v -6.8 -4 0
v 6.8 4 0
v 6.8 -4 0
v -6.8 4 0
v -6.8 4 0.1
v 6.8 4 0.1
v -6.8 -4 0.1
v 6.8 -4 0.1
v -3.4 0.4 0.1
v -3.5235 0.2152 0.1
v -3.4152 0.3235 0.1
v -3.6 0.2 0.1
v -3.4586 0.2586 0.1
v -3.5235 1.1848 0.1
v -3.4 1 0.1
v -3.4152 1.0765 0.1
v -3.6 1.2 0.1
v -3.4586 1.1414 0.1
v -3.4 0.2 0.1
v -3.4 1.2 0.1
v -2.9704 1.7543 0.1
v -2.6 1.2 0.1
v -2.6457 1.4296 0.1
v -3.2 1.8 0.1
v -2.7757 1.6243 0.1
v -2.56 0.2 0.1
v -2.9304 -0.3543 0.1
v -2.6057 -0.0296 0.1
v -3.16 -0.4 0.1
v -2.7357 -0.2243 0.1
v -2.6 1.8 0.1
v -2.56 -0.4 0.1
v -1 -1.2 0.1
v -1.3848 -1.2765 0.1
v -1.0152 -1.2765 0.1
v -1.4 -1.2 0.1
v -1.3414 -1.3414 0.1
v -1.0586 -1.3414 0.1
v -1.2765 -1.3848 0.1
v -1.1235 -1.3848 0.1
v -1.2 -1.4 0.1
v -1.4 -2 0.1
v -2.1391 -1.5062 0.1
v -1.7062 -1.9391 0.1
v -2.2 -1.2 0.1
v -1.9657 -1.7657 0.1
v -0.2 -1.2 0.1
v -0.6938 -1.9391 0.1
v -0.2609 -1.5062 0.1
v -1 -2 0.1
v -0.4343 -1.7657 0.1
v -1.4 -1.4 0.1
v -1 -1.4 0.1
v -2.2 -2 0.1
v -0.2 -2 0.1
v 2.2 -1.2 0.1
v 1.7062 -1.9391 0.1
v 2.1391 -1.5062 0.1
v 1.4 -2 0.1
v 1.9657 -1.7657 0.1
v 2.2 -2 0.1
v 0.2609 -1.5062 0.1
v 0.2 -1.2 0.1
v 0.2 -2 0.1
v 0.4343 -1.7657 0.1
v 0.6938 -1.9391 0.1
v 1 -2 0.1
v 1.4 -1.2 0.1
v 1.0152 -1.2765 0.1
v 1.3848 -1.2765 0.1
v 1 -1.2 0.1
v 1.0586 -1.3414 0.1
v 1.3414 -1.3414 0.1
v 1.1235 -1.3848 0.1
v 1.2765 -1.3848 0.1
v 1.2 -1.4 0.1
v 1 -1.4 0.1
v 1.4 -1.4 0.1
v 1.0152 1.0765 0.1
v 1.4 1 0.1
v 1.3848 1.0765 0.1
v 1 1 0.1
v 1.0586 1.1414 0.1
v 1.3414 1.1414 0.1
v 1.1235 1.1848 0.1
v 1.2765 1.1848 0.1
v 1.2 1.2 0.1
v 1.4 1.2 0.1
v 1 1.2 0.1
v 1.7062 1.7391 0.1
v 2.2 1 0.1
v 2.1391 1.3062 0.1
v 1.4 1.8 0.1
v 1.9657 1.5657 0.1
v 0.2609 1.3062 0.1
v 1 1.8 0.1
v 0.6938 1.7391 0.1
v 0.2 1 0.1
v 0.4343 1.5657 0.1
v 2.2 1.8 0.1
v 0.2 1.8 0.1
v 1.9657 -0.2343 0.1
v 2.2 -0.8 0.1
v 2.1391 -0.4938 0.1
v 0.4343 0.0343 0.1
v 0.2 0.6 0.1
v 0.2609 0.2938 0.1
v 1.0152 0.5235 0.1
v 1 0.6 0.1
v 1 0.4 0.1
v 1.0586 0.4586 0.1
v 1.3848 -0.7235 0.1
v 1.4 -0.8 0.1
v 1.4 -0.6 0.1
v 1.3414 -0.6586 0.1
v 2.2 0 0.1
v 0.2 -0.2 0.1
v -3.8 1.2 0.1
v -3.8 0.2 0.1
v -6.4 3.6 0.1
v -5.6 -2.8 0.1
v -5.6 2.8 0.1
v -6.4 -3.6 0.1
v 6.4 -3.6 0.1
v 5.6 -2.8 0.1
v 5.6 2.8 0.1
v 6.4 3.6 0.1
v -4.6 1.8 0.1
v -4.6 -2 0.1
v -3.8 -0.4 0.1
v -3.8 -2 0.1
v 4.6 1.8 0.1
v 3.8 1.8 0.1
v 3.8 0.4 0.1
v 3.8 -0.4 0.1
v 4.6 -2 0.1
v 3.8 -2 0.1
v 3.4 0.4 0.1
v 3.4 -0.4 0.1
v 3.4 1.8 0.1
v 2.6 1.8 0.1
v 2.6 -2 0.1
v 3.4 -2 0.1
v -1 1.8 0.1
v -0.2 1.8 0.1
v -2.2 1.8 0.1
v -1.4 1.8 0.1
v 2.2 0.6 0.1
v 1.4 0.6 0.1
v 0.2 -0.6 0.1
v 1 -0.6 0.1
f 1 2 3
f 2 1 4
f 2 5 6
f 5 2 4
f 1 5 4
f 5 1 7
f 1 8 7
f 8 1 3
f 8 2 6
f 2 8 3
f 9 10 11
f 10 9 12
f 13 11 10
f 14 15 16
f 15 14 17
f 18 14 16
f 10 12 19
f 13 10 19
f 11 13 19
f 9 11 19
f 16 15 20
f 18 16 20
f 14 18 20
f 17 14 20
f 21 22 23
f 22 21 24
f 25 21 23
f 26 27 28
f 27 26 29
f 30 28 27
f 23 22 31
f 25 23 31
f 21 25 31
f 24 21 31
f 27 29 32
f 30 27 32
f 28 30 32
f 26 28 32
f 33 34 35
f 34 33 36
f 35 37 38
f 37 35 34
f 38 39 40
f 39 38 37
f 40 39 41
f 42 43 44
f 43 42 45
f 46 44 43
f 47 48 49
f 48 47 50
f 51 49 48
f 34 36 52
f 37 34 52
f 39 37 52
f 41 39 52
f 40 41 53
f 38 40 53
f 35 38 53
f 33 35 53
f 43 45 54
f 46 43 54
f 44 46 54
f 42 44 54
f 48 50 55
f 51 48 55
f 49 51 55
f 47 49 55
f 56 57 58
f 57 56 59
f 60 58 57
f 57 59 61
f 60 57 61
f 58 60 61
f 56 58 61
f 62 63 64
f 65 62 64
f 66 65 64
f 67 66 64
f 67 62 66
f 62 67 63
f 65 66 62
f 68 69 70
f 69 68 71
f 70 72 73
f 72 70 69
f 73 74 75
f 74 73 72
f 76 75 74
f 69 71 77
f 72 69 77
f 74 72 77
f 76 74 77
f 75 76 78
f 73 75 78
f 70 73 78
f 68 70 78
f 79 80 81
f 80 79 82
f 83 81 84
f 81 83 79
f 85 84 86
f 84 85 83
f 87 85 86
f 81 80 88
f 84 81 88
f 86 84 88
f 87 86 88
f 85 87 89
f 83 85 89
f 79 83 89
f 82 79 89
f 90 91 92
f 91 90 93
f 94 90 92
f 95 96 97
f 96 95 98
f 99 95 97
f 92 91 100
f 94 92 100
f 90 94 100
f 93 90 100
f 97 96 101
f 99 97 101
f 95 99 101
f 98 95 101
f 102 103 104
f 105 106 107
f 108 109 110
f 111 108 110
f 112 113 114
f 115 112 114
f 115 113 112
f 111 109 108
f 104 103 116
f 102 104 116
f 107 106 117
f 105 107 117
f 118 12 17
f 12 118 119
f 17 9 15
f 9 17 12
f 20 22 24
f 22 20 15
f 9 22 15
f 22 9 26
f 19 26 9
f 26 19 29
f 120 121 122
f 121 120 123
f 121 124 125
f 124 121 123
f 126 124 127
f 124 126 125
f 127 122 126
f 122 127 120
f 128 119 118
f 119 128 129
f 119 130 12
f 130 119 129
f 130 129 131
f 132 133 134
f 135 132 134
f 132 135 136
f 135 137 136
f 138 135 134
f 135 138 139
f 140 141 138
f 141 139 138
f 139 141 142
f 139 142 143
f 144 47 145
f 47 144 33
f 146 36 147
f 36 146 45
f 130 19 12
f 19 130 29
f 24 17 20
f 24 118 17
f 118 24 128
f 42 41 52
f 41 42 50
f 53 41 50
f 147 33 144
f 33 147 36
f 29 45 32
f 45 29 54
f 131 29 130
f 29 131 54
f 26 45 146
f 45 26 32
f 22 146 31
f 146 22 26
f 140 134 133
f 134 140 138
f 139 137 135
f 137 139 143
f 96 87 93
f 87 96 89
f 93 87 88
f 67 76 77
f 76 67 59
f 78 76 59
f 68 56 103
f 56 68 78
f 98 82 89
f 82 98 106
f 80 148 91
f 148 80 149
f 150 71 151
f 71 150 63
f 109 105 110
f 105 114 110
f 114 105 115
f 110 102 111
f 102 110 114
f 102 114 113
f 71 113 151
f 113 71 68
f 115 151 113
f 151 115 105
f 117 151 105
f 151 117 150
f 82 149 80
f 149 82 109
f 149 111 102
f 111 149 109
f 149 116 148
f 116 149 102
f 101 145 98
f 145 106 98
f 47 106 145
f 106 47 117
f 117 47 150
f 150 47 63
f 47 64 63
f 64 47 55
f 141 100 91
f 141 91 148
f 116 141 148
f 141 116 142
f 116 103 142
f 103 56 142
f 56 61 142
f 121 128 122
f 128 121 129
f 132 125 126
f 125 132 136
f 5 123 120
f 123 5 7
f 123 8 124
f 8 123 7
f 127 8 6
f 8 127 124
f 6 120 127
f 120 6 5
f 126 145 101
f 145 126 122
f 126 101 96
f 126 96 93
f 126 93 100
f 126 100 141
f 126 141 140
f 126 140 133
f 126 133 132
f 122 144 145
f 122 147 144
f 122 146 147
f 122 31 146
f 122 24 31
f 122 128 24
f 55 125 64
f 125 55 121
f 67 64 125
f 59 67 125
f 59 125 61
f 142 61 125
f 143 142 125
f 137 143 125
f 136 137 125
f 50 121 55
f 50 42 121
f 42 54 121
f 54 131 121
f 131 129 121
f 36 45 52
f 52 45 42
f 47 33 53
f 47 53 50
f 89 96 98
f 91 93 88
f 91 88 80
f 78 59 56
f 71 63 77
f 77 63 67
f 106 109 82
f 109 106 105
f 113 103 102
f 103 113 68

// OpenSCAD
// file: ../p/box5-12.scad
use <../lib.scad>
function ldraw_lib__box5_12() = [
// 0 Box with 5 Faces without Any Edges
// 0 Name: box5-12.dat
// 0 Author: Chris Dee [cwdee]
// 0 !LDRAW_ORG Primitive UPDATE 2009-02
// 0 !LICENSE Licensed under CC BY 2.0 and CC BY 4.0 : see CAreadme.txt
// 
// 0 BFC CERTIFY CCW
  [0,"BFC","CERTIFY"],
  [0,"BFC","CCW"],
// 
// 0 !HISTORY 2009-09-03 [PTadmin] Official Update 2009-02
// 
// 
// 4 16 1 1 1 1 1 -1 -1 1 -1 -1 1 1
  [4,16,1,1,1,1,1,-1,-1,1,-1,-1,1,1],
// 4 16 -1 0 1 1 0 1 1 1 1 -1 1 1
  [4,16,-1,0,1,1,0,1,1,1,1,-1,1,1],
// 4 16 -1 0 -1 -1 0 1 -1 1 1 -1 1 -1
  [4,16,-1,0,-1,-1,0,1,-1,1,1,-1,1,-1],
// 4 16 1 0 -1 -1 0 -1 -1 1 -1 1 1 -1
  [4,16,1,0,-1,-1,0,-1,-1,1,-1,1,1,-1],
// 4 16 1 0 1 1 0 -1 1 1 -1 1 1 1
  [4,16,1,0,1,1,0,-1,1,1,-1,1,1,1],
// 0
];
makepoly(ldraw_lib__box5_12(), line=0.2);
// file: ../p/2-4ndis.scad
use <../lib.scad>
function ldraw_lib__2_4ndis() = [
// 0 Disc Negative 0.5
// 0 Name: 2-4ndis.dat
// 0 Author: James Jessiman
// 0 !LDRAW_ORG Primitive UPDATE 2012-01
// 0 !LICENSE Licensed under CC BY 2.0 and CC BY 4.0 : see CAreadme.txt
// 
// 0 BFC CERTIFY CCW
  [0,"BFC","CERTIFY"],
  [0,"BFC","CCW"],
// 
// 0 !HISTORY 2002-03-23 [sbliss] Added BFC statement; compacted code
// 0 !HISTORY 2002-04-25 [PTadmin] Official Update 2002-02
// 0 !HISTORY 2007-06-24 [PTadmin] Header formatted for Contributor Agreement
// 0 !HISTORY 2008-07-01 [PTadmin] Official Update 2008-01
// 0 !HISTORY 2012-02-16 [Philo] Changed to CCW
// 0 !HISTORY 2012-03-30 [PTadmin] Official Update 2012-01
// 
// 
// 3 16 0.9239 0 0.3827 1 0 0 1 0 1
  [3,16,0.9239,0,0.3827,1,0,0,1,0,1],
// 3 16 0.7071 0 0.7071 0.9239 0 0.3827 1 0 1
  [3,16,0.7071,0,0.7071,0.9239,0,0.3827,1,0,1],
// 3 16 0.3827 0 0.9239 0.7071 0 0.7071 1 0 1
  [3,16,0.3827,0,0.9239,0.7071,0,0.7071,1,0,1],
// 3 16 0 0 1 0.3827 0 0.9239 1 0 1
  [3,16,0,0,1,0.3827,0,0.9239,1,0,1],
// 3 16 -0.3827 0 0.9239 0 0 1 -1 0 1
  [3,16,-0.3827,0,0.9239,0,0,1,-1,0,1],
// 3 16 -0.7071 0 0.7071 -0.3827 0 0.9239 -1 0 1
  [3,16,-0.7071,0,0.7071,-0.3827,0,0.9239,-1,0,1],
// 3 16 -0.9239 0 0.3827 -0.7071 0 0.7071 -1 0 1
  [3,16,-0.9239,0,0.3827,-0.7071,0,0.7071,-1,0,1],
// 3 16 -1 0 0 -0.9239 0 0.3827 -1 0 1
  [3,16,-1,0,0,-0.9239,0,0.3827,-1,0,1],
];
makepoly(ldraw_lib__2_4ndis(), line=0.2);
// file: ../p/2-4chrd.scad
use <../lib.scad>
function ldraw_lib__2_4chrd() = [
// 0 Chord 0.5
// 0 Name: 2-4chrd.dat
// 0 Author: Philippe Hurbain [Philo]
// 0 !LDRAW_ORG Primitive UPDATE 2014-01
// 0 !LICENSE Licensed under CC BY 2.0 and CC BY 4.0 : see CAreadme.txt
// 
// 0 BFC CERTIFY CCW
  [0,"BFC","CERTIFY"],
  [0,"BFC","CCW"],
// 
// 0 !HISTORY 2014-06-21 [PTadmin] Official Update 2014-01
// 
// 
// 4 16 0.9239 0 0.3827 -0.9239 0 0.3827 -1 0 0 1 0 0
  [4,16,0.9239,0,0.3827,-0.9239,0,0.3827,-1,0,0,1,0,0],
// 4 16 0.7071 0 0.7071 -0.7071 0 0.7071 -0.9239 0 0.3827 0.9239 0 0.3827
  [4,16,0.7071,0,0.7071,-0.7071,0,0.7071,-0.9239,0,0.3827,0.9239,0,0.3827],
// 4 16 0.3827 0 0.9239 -0.3827 0 0.9239 -0.7071 0 0.7071 0.7071 0 0.7071
  [4,16,0.3827,0,0.9239,-0.3827,0,0.9239,-0.7071,0,0.7071,0.7071,0,0.7071],
// 3 16 0 0 1 -0.3827 0 0.9239 0.3827 0 0.9239
  [3,16,0,0,1,-0.3827,0,0.9239,0.3827,0,0.9239],
];
makepoly(ldraw_lib__2_4chrd(), line=0.2);
// file: ../p/1-8ndis.scad
use <../lib.scad>
function ldraw_lib__1_8ndis() = [
// 0 Disc Negative 0.125
// 0 Name: 1-8ndis.dat
// 0 Author: James Jessiman
// 0 !LDRAW_ORG Primitive UPDATE 2012-01
// 0 !LICENSE Licensed under CC BY 2.0 and CC BY 4.0 : see CAreadme.txt
// 
// 0 BFC CERTIFY CCW
  [0,"BFC","CERTIFY"],
  [0,"BFC","CCW"],
// 
// 0 !HISTORY 2002-03-23 [sbliss] Added BFC statement
// 0 !HISTORY 2002-04-25 [PTadmin] Official Update 2002-02
// 0 !HISTORY 2007-06-22 [PTadmin] Header formatted for Contributor Agreement
// 0 !HISTORY 2008-07-01 [PTadmin] Official Update 2008-01
// 0 !HISTORY 2012-02-16 [Philo] Changed to CCW
// 0 !HISTORY 2012-03-30 [PTadmin] Official Update 2012-01
// 
// 
// 3 16 0.9239 0 0.3827 1 0 0 1 0 1
  [3,16,0.9239,0,0.3827,1,0,0,1,0,1],
// 3 16 0.7071 0 0.7071 0.9239 0 0.3827 1 0 1
  [3,16,0.7071,0,0.7071,0.9239,0,0.3827,1,0,1],
];
makepoly(ldraw_lib__1_8ndis(), line=0.2);
// file: ../p/1-8chrd.scad
use <../lib.scad>
function ldraw_lib__1_8chrd() = [
// 0 Chord 0.125
// 0 Name: 1-8chrd.dat
// 0 Author: Andy Westrate [westrate]
// 0 !LDRAW_ORG Primitive UPDATE 2004-02
// 0 !LICENSE Licensed under CC BY 2.0 and CC BY 4.0 : see CAreadme.txt
// 
// 0 BFC CERTIFY CCW
  [0,"BFC","CERTIFY"],
  [0,"BFC","CCW"],
// 
// 0 !HISTORY 2004-04-22 [PTadmin] Official Update 2004-02
// 0 !HISTORY 2007-06-22 [PTadmin] Header formatted for Contributor Agreement
// 0 !HISTORY 2008-07-01 [PTadmin] Official Update 2008-01
// 
// 
// 3 16 0.7071 0 0.7071 1 0 0 0.9239 0 0.3827
  [3,16,0.7071,0,0.7071,1,0,0,0.9239,0,0.3827],
// 
// 0
];
makepoly(ldraw_lib__1_8chrd(), line=0.2);
// file: ../p/1-4ndis.scad
use <../lib.scad>
function ldraw_lib__1_4ndis() = [
// 0 Disc Negative 0.25
// 0 Name: 1-4ndis.dat
// 0 Author: James Jessiman
// 0 !LDRAW_ORG Primitive UPDATE 2012-01
// 0 !LICENSE Licensed under CC BY 2.0 and CC BY 4.0 : see CAreadme.txt
// 
// 0 BFC CERTIFY CCW
  [0,"BFC","CERTIFY"],
  [0,"BFC","CCW"],
// 
// 0 !HISTORY 2002-03-23 [sbliss] Added BFC Statement
// 0 !HISTORY 2002-04-25 [PTadmin] Official Update 2002-02
// 0 !HISTORY 2007-06-22 [PTadmin] Header formatted for Contributor Agreement
// 0 !HISTORY 2008-07-01 [PTadmin] Official Update 2008-01
// 0 !HISTORY 2012-02-16 [Philo] Changed to CCW
// 0 !HISTORY 2012-03-30 [PTadmin] Official Update 2012-01
// 
// 
// 3 16 0.9239 0 0.3827 1 0 0 1 0 1
  [3,16,0.9239,0,0.3827,1,0,0,1,0,1],
// 3 16 0.7071 0 0.7071 0.9239 0 0.3827 1 0 1
  [3,16,0.7071,0,0.7071,0.9239,0,0.3827,1,0,1],
// 3 16 0.3827 0 0.9239 0.7071 0 0.7071 1 0 1
  [3,16,0.3827,0,0.9239,0.7071,0,0.7071,1,0,1],
// 3 16 0 0 1 0.3827 0 0.9239 1 0 1
  [3,16,0,0,1,0.3827,0,0.9239,1,0,1],
];
makepoly(ldraw_lib__1_4ndis(), line=0.2);
// file: ../p/1-4chrd.scad
use <../lib.scad>
function ldraw_lib__1_4chrd() = [
// 0 Chord 0.25
// 0 Name: 1-4chrd.dat
// 0 Author: Tony Hafner [hafhead]
// 0 !LDRAW_ORG Primitive UPDATE 2012-02
// 0 !LICENSE Licensed under CC BY 2.0 and CC BY 4.0 : see CAreadme.txt
// 
// 0 BFC CERTIFY CCW
  [0,"BFC","CERTIFY"],
  [0,"BFC","CCW"],
// 
// 0 !HISTORY 2004-04-22 [PTadmin] Official Update 2004-02
// 0 !HISTORY 2007-10-09 [PTadmin] Header formatted for Contributor Agreement
// 0 !HISTORY 2008-07-01 [PTadmin] Official Update 2008-01
// 0 !HISTORY 2012-08-02 [MMR1988] Re-creation with PrimGen2 and Rectifier
// 0 !HISTORY 2012-08-09 [PTadmin] Official Update 2012-02
// 
// 
// 4 16 0.9239 0 0.3827 0.3827 0 0.9239 0 0 1 1 0 0
  [4,16,0.9239,0,0.3827,0.3827,0,0.9239,0,0,1,1,0,0],
// 3 16 0.7071 0 0.7071 0.3827 0 0.9239 0.9239 0 0.3827
  [3,16,0.7071,0,0.7071,0.3827,0,0.9239,0.9239,0,0.3827],
];
makepoly(ldraw_lib__1_4chrd(), line=0.2);
// main file
use <../lib.scad>
use <../p/1-4chrd.scad>
use <../p/1-4ndis.scad>
use <../p/1-8chrd.scad>
use <../p/1-8ndis.scad>
use <../p/2-4chrd.scad>
use <../p/2-4ndis.scad>
use <../p/box5-12.scad>
function ldraw_lib__4201018c() = [
// 0 Sticker  1.0 x  1.7 with White "PUSH"
// 0 Name: 4201018c.dat
// 0 Author: Tim Lampmann [L4mpi]
// 0 !LDRAW_ORG Part UPDATE 2019-03
// 0 !LICENSE Licensed under CC BY 2.0 and CC BY 4.0 : see CAreadme.txt
// 
// 0 BFC CERTIFY CCW
  [0,"BFC","CERTIFY"],
  [0,"BFC","CCW"],
// 
// 0 !KEYWORDS Grand Central Station, Set 4513, Train
// 
// 0 !HISTORY 2019-12-27 [PTadmin] Official Update 2019-03
// 
// 
// 1 16 0 -0.25 0 17 0 0 0 0.25 0 0 0 10 box5-12.dat
  [1,16,0,-0.25,0,17,0,0,0,0.25,0,0,0,10, ldraw_lib__box5_12()],
// 
// 1 16 -9 -.25 1 0 0 .5 0 1 0 -.5 0 0 1-4chrd.dat
  [1,16,-9,-.25,1,0,0,.5,0,1,0,-.5,0,0, ldraw_lib__1_4chrd()],
// 1 16 -9 -.25 2.5 .5 0 0 0 1 0 0 0 .5 1-4chrd.dat
  [1,16,-9,-.25,2.5,.5,0,0,0,1,0,0,0,.5, ldraw_lib__1_4chrd()],
// 1 15 -9 -0.25 1 0 0 0.5 0 1 0 -0.5 0 0 1-4ndis.dat
  [1,15,-9,-0.25,1,0,0,0.5,0,1,0,-0.5,0,0, ldraw_lib__1_4ndis()],
// 1 15 -9 -0.25 2.5 0.5 0 0 0 1 0 0 0 0.5 1-4ndis.dat
  [1,15,-9,-0.25,2.5,0.5,0,0,0,1,0,0,0,0.5, ldraw_lib__1_4ndis()],
// 1 15 -8 -0.25 3 1.5 0 0 0 1 0 0 0 1.5 1-4chrd.dat
  [1,15,-8,-0.25,3,1.5,0,0,0,1,0,0,0,1.5, ldraw_lib__1_4chrd()],
// 1 15 -7.9 -0.25 0.5 0 0 1.5 0 1 0 -1.5 0 0 1-4chrd.dat
  [1,15,-7.9,-0.25,0.5,0,0,1.5,0,1,0,-1.5,0,0, ldraw_lib__1_4chrd()],
// 1 16 -8 -0.25 3 1.5 0 0 0 1 0 0 0 1.5 1-4ndis.dat
  [1,16,-8,-0.25,3,1.5,0,0,0,1,0,0,0,1.5, ldraw_lib__1_4ndis()],
// 1 16 -7.9 -0.25 0.5 0 0 1.5 0 1 0 -1.5 0 0 1-4ndis.dat
  [1,16,-7.9,-0.25,0.5,0,0,1.5,0,1,0,-1.5,0,0, ldraw_lib__1_4ndis()],
// 1 16 -3 -.25 -3 .5 0 0 0 1 0 0 0 -.5 2-4chrd.dat
  [1,16,-3,-.25,-3,.5,0,0,0,1,0,0,0,-.5, ldraw_lib__2_4chrd()],
// 1 15 -3.5 -0.25 -3 -2 0 0 0 1 0 0 0 -2 1-4chrd.dat
  [1,15,-3.5,-0.25,-3,-2,0,0,0,1,0,0,0,-2, ldraw_lib__1_4chrd()],
// 1 15 -2.5 -0.25 -3 0 0 2 0 1 0 -2 0 0 1-4chrd.dat
  [1,15,-2.5,-0.25,-3,0,0,2,0,1,0,-2,0,0, ldraw_lib__1_4chrd()],
// 1 15 -3 -0.25 -3 -0.5 0 0 0 1 0 0 0 -0.5 2-4ndis.dat
  [1,15,-3,-0.25,-3,-0.5,0,0,0,1,0,0,0,-0.5, ldraw_lib__2_4ndis()],
// 1 16 -3.5 -0.25 -3 -2 0 0 0 1 0 0 0 -2 1-4ndis.dat
  [1,16,-3.5,-0.25,-3,-2,0,0,0,1,0,0,0,-2, ldraw_lib__1_4ndis()],
// 1 16 -2.5 -0.25 -3 0 0 2 0 1 0 -2 0 0 1-4ndis.dat
  [1,16,-2.5,-0.25,-3,0,0,2,0,1,0,-2,0,0, ldraw_lib__1_4ndis()],
// 1 15 3.5 -0.25 -3 0 0 2 0 1 0 -2 0 0 1-4chrd.dat
  [1,15,3.5,-0.25,-3,0,0,2,0,1,0,-2,0,0, ldraw_lib__1_4chrd()],
// 1 16 3.5 -0.25 -3 0 0 2 0 1 0 -2 0 0 1-4ndis.dat
  [1,16,3.5,-0.25,-3,0,0,2,0,1,0,-2,0,0, ldraw_lib__1_4ndis()],
// 1 16 2.5 -0.25 -3 -2 0 0 0 1 0 0 0 -2 1-4ndis.dat
  [1,16,2.5,-0.25,-3,-2,0,0,0,1,0,0,0,-2, ldraw_lib__1_4ndis()],
// 1 15 2.5 -0.25 -3 -2 0 0 0 1 0 0 0 -2 1-4chrd.dat
  [1,15,2.5,-0.25,-3,-2,0,0,0,1,0,0,0,-2, ldraw_lib__1_4chrd()],
// 1 16 3 -0.25 -3 -0.5 0 0 0 1 0 0 0 -0.5 2-4chrd.dat
  [1,16,3,-0.25,-3,-0.5,0,0,0,1,0,0,0,-0.5, ldraw_lib__2_4chrd()],
// 1 15 3 -0.25 -3 -0.5 0 0 0 1 0 0 0 -0.5 2-4ndis.dat
  [1,15,3,-0.25,-3,-0.5,0,0,0,1,0,0,0,-0.5, ldraw_lib__2_4ndis()],
// 1 16 3 -0.25 2.5 0.5 0 0 0 1 0 0 0 0.5 2-4chrd.dat
  [1,16,3,-0.25,2.5,0.5,0,0,0,1,0,0,0,0.5, ldraw_lib__2_4chrd()],
// 1 15 3 -0.25 2.5 0.5 0 0 0 1 0 0 0 0.5 2-4ndis.dat
  [1,15,3,-0.25,2.5,0.5,0,0,0,1,0,0,0,0.5, ldraw_lib__2_4ndis()],
// 1 15 3.5 -0.25 2.5 2 0 0 0 1 0 0 0 2 1-4chrd.dat
  [1,15,3.5,-0.25,2.5,2,0,0,0,1,0,0,0,2, ldraw_lib__1_4chrd()],
// 1 15 2.5 -0.25 2.5 0 0 -2 0 1 0 2 0 0 1-4chrd.dat
  [1,15,2.5,-0.25,2.5,0,0,-2,0,1,0,2,0,0, ldraw_lib__1_4chrd()],
// 1 16 3.5 -0.25 2.5 2 0 0 0 1 0 0 0 2 1-4ndis.dat
  [1,16,3.5,-0.25,2.5,2,0,0,0,1,0,0,0,2, ldraw_lib__1_4ndis()],
// 1 16 2.5 -0.25 2.5 0 0 -2 0 1 0 2 0 0 1-4ndis.dat
  [1,16,2.5,-0.25,2.5,0,0,-2,0,1,0,2,0,0, ldraw_lib__1_4ndis()],
// 1 15 3.5 -0.25 -2 2 0 0 0 1 0 0 0 2 1-8chrd.dat
  [1,15,3.5,-0.25,-2,2,0,0,0,1,0,0,0,2, ldraw_lib__1_8chrd()],
// 1 15 2.5 -0.25 1.5 -2 0 0 0 1 0 0 0 -2 1-8chrd.dat
  [1,15,2.5,-0.25,1.5,-2,0,0,0,1,0,0,0,-2, ldraw_lib__1_8chrd()],
// 1 15 3 -0.25 1.5 -0.5 0 0 0 1 0 0 0 -0.5 1-8ndis.dat
  [1,15,3,-0.25,1.5,-0.5,0,0,0,1,0,0,0,-0.5, ldraw_lib__1_8ndis()],
// 1 15 3 -0.25 -2 0.5 0 0 0 1 0 0 0 0.5 1-8ndis.dat
  [1,15,3,-0.25,-2,0.5,0,0,0,1,0,0,0,0.5, ldraw_lib__1_8ndis()],
// 1 16 3 -0.25 -2 0.5 0 0 0 1 0 0 0 0.5 1-8chrd.dat
  [1,16,3,-0.25,-2,0.5,0,0,0,1,0,0,0,0.5, ldraw_lib__1_8chrd()],
// 1 16 3 -0.25 1.5 -0.5 0 0 0 1 0 0 0 -0.5 1-8chrd.dat
  [1,16,3,-0.25,1.5,-0.5,0,0,0,1,0,0,0,-0.5, ldraw_lib__1_8chrd()],
// 1 16 3.5 -0.25 -2 2 0 0 0 1 0 0 0 2 1-8ndis.dat
  [1,16,3.5,-0.25,-2,2,0,0,0,1,0,0,0,2, ldraw_lib__1_8ndis()],
// 1 16 2.5 -0.25 1.5 -2 0 0 0 1 0 0 0 -2 1-8ndis.dat
  [1,16,2.5,-0.25,1.5,-2,0,0,0,1,0,0,0,-2, ldraw_lib__1_8ndis()],
// 4 16 -9.5 -.25 3 -9.5 -.25 .5 -9 -.25 .5 -9 -.25 3
  [4,16,-9.5,-.25,3,-9.5,-.25,.5,-9,-.25,.5,-9,-.25,3],
// 4 16 -8.5 -.25 2.5 -9 -.25 3 -9 -.25 .5 -8.5 -.25 1
  [4,16,-8.5,-.25,2.5,-9,-.25,3,-9,-.25,.5,-8.5,-.25,1],
// 4 15 -8 -.25 4.5 -8.5 -.25 3 -8.5 -.25 2.5 -6.5 -.25 3
  [4,15,-8,-.25,4.5,-8.5,-.25,3,-8.5,-.25,2.5,-6.5,-.25,3],
// 4 15 -6.5 -.25 3 -8.5 -.25 2.5 -8.5 -.25 1 -6.4 -.25 .5
  [4,15,-6.5,-.25,3,-8.5,-.25,2.5,-8.5,-.25,1,-6.4,-.25,.5],
// 4 15 -6.4 -.25 .5 -8.5 -.25 1 -8.5 -.25 .5 -7.9 -.25 -1
  [4,15,-6.4,-.25,.5,-8.5,-.25,1,-8.5,-.25,.5,-7.9,-.25,-1],
// 4 15 -14 -0.25 -7 -14 -0.25 7 -16 -0.25 9 -16 -0.25 -9
  [4,15,-14,-0.25,-7,-14,-0.25,7,-16,-0.25,9,-16,-0.25,-9],
// 4 15 -14 -0.25 -7 -16 -0.25 -9 16 -0.25 -9 14 -0.25 -7
  [4,15,-14,-0.25,-7,-16,-0.25,-9,16,-0.25,-9,14,-0.25,-7],
// 4 15 14 -0.25 7 14 -0.25 -7 16 -0.25 -9 16 -0.25 9
  [4,15,14,-0.25,7,14,-0.25,-7,16,-0.25,-9,16,-0.25,9],
// 4 15 14 -0.25 7 16 -0.25 9 -16 -0.25 9 -14 -0.25 7
  [4,15,14,-0.25,7,16,-0.25,9,-16,-0.25,9,-14,-0.25,7],
// 4 15 -9.5 -0.25 3 -11.5 -0.25 4.5 -11.5 -0.25 -5 -9.5 -0.25 0.5
  [4,15,-9.5,-0.25,3,-11.5,-0.25,4.5,-11.5,-0.25,-5,-9.5,-0.25,0.5],
// 4 15 -9.5 -0.25 0.5 -11.5 -0.25 -5 -9.5 -0.25 -1 -9 -0.25 0.5
  [4,15,-9.5,-0.25,0.5,-11.5,-0.25,-5,-9.5,-0.25,-1,-9,-0.25,0.5],
// 3 15 -9.5 -0.25 -1 -11.5 -0.25 -5 -9.5 -0.25 -5
  [3,15,-9.5,-0.25,-1,-11.5,-0.25,-5,-9.5,-0.25,-5],
// 3 15 11.5 -0.25 4.5 9.5 -0.25 4.5 9.5 -0.25 1
  [3,15,11.5,-0.25,4.5,9.5,-0.25,4.5,9.5,-0.25,1],
// 4 15 11.5 -0.25 4.5 9.5 -0.25 1 9.5 -0.25 -1 11.5 -0.25 -5
  [4,15,11.5,-0.25,4.5,9.5,-0.25,1,9.5,-0.25,-1,11.5,-0.25,-5],
// 3 15 9.5 -0.25 -1 9.5 -0.25 -5 11.5 -0.25 -5
  [3,15,9.5,-0.25,-1,9.5,-0.25,-5,11.5,-0.25,-5],
// 4 15 8.5 -0.25 1 8.5 -0.25 -1 9.5 -0.25 -1 9.5 -0.25 1
  [4,15,8.5,-0.25,1,8.5,-0.25,-1,9.5,-0.25,-1,9.5,-0.25,1],
// 3 15 8.5 -0.25 4.5 6.5 -0.25 4.5 8.5 -0.25 1
  [3,15,8.5,-0.25,4.5,6.5,-0.25,4.5,8.5,-0.25,1],
// 4 15 8.5 -0.25 -1 8.5 -0.25 1 6.5 -0.25 4.5 6.5 -0.25 -5
  [4,15,8.5,-0.25,-1,8.5,-0.25,1,6.5,-0.25,4.5,6.5,-0.25,-5],
// 3 15 8.5 -0.25 -1 6.5 -0.25 -5 8.5 -0.25 -5
  [3,15,8.5,-0.25,-1,6.5,-0.25,-5,8.5,-0.25,-5],
// 4 15 -2.5 -0.25 -3 -0.5 -0.25 -3 -0.5 -0.25 4.5 -2.5 -0.25 4.5
  [4,15,-2.5,-0.25,-3,-0.5,-0.25,-3,-0.5,-0.25,4.5,-2.5,-0.25,4.5],
// 4 15 -5.5 -0.25 -3 -3.5 -0.25 -3 -3.5 -0.25 4.5 -5.5 -0.25 4.5
  [4,15,-5.5,-0.25,-3,-3.5,-0.25,-3,-3.5,-0.25,4.5,-5.5,-0.25,4.5],
// 4 15 -9.5 -0.25 -1 -7.9 -0.25 -1 -8.5 -0.25 0.5 -9 -0.25 0.5
  [4,15,-9.5,-0.25,-1,-7.9,-0.25,-1,-8.5,-0.25,0.5,-9,-0.25,0.5],
// 3 15 -8 -0.25 4.5 -9 -0.25 3 -8.5 -0.25 3
  [3,15,-8,-0.25,4.5,-9,-0.25,3,-8.5,-0.25,3],
// 4 15 -9.5 -0.25 3 -9 -0.25 3 -8 -0.25 4.5 -11.5 -0.25 4.5
  [4,15,-9.5,-0.25,3,-9,-0.25,3,-8,-0.25,4.5,-11.5,-0.25,4.5],
// 4 15 -3.5 -0.25 -3.5 -3.5 -0.25 -5 -2.5 -0.25 -5 -3 -0.25 -3.5
  [4,15,-3.5,-0.25,-3.5,-3.5,-0.25,-5,-2.5,-0.25,-5,-3,-0.25,-3.5],
// 3 15 -2.5 -0.25 -3.5 -3 -0.25 -3.5 -2.5 -0.25 -5
  [3,15,-2.5,-0.25,-3.5,-3,-0.25,-3.5,-2.5,-0.25,-5],
// 4 16 -3.5 -.25 4.5 -3.5 -.25 -3 -2.5 -.25 -3 -2.5 -.25 4.5
  [4,16,-3.5,-.25,4.5,-3.5,-.25,-3,-2.5,-.25,-3,-2.5,-.25,4.5],
// 4 16 -5.5 -0.25 -5 -5.5 -0.25 -3 -6.4 -0.25 -1 -7.9 -0.25 -1
  [4,16,-5.5,-0.25,-5,-5.5,-0.25,-3,-6.4,-0.25,-1,-7.9,-0.25,-1],
// 4 16 -9.5 -0.25 -5 -5.5 -0.25 -5 -7.9 -0.25 -1 -9.5 -0.25 -1
  [4,16,-9.5,-0.25,-5,-5.5,-0.25,-5,-7.9,-0.25,-1,-9.5,-0.25,-1],
// 4 16 -6.4 -0.25 0.5 -6.4 -0.25 -1 -5.5 -0.25 -3 -5.5 -0.25 4.5
  [4,16,-6.4,-0.25,0.5,-6.4,-0.25,-1,-5.5,-0.25,-3,-5.5,-0.25,4.5],
// 4 16 -6.5 -0.25 3 -6.4 -0.25 0.5 -5.5 -0.25 4.5 -6.5 -0.25 4.5
  [4,16,-6.5,-0.25,3,-6.4,-0.25,0.5,-5.5,-0.25,4.5,-6.5,-0.25,4.5],
// 4 16 9.5 -0.25 1 9.5 -0.25 4.5 8.5 -0.25 4.5 8.5 -0.25 1
  [4,16,9.5,-0.25,1,9.5,-0.25,4.5,8.5,-0.25,4.5,8.5,-0.25,1],
// 4 16 9.5 -0.25 -5 9.5 -0.25 -1 8.5 -0.25 -1 8.5 -0.25 -5
  [4,16,9.5,-0.25,-5,9.5,-0.25,-1,8.5,-0.25,-1,8.5,-0.25,-5],
// 4 15 2.5 -0.25 4.5 2.5 -0.25 3 3 -0.25 3 3.5 -0.25 4.5
  [4,15,2.5,-0.25,4.5,2.5,-0.25,3,3,-0.25,3,3.5,-0.25,4.5],
// 3 15 3.5 -0.25 4.5 3 -0.25 3 3.5 -0.25 3
  [3,15,3.5,-0.25,4.5,3,-0.25,3,3.5,-0.25,3],
// 4 15 3 -0.25 -3.5 2.5 -0.25 -3.5 2.5 -0.25 -5 3.5 -0.25 -5
  [4,15,3,-0.25,-3.5,2.5,-0.25,-3.5,2.5,-0.25,-5,3.5,-0.25,-5],
// 3 15 3.5 -0.25 -3.5 3 -0.25 -3.5 3.5 -0.25 -5
  [3,15,3.5,-0.25,-3.5,3,-0.25,-3.5,3.5,-0.25,-5],
// 4 15 5.5 -.25 -2 3.5 -.25 -3 3.5 -.25 -3.5 5.5 -.25 -3
  [4,15,5.5,-.25,-2,3.5,-.25,-3,3.5,-.25,-3.5,5.5,-.25,-3],
// 4 15 .5 -.25 1.5 2.5 -.25 2.5 2.5 -.25 3 .5 -.25 2.5
  [4,15,.5,-.25,1.5,2.5,-.25,2.5,2.5,-.25,3,.5,-.25,2.5],
// 4 15 3.5 -0.25 1.5 5.5 -0.25 1.5 5.5 -0.25 2.5 3.5 -0.25 2.5
  [4,15,3.5,-0.25,1.5,5.5,-0.25,1.5,5.5,-0.25,2.5,3.5,-0.25,2.5],
// 4 15 2.5 -0.25 -1.5 0.5 -0.25 -1.5 0.5 -0.25 -3 2.5 -0.25 -3
  [4,15,2.5,-0.25,-1.5,0.5,-0.25,-1.5,0.5,-0.25,-3,2.5,-0.25,-3],
// 3 15 2.5 -0.25 1.5 1.0858 -0.25 0.0858 2.5 -0.25 1
  [3,15,2.5,-0.25,1.5,1.0858,-0.25,0.0858,2.5,-0.25,1],
// 4 15 2.5 -0.25 1 1.0858 -0.25 0.0858 3.35355 -0.25 -1.64645 3.5 -0.25 -1.5
  [4,15,2.5,-0.25,1,1.0858,-0.25,0.0858,3.35355,-0.25,-1.64645,3.5,-0.25,-1.5],
// 4 15 2.64645 -0.25 1.14645 2.5 -0.25 1 3.5 -0.25 -1.5 4.9142 -0.25 -0.5858
  [4,15,2.64645,-0.25,1.14645,2.5,-0.25,1,3.5,-0.25,-1.5,4.9142,-0.25,-0.5858],
// 3 15 4.9142 -0.25 -0.5858 3.5 -0.25 -1.5 3.5 -0.25 -2
  [3,15,4.9142,-0.25,-0.5858,3.5,-0.25,-1.5,3.5,-0.25,-2],
// 4 16 2.5 -.25 -3 3.5 -.25 -3 3.5 -.25 -2 2.5 -.25 -1.5
  [4,16,2.5,-.25,-3,3.5,-.25,-3,3.5,-.25,-2,2.5,-.25,-1.5],
// 4 16 2.5 -.25 -1.5 3.5 -.25 -2 3.35355 -.25 -1.64645 1.0858 -.25 .0858
  [4,16,2.5,-.25,-1.5,3.5,-.25,-2,3.35355,-.25,-1.64645,1.0858,-.25,.0858],
// 4 16 2.5 -0.25 -1.5 1.0858 -0.25 0.0858 0.5 -0.25 -0.5 0.5 -0.25 -1.5
  [4,16,2.5,-0.25,-1.5,1.0858,-0.25,0.0858,0.5,-0.25,-0.5,0.5,-0.25,-1.5],
// 4 16 3.5 -.25 2.5 2.5 -.25 2.5 2.5 -.25 1.5 3.5 -.25 1.5
  [4,16,3.5,-.25,2.5,2.5,-.25,2.5,2.5,-.25,1.5,3.5,-.25,1.5],
// 4 16 3.5 -.25 1.5 2.5 -.25 1.5 2.64645 -.25 1.14645 4.9142 -.25 -.5858
  [4,16,3.5,-.25,1.5,2.5,-.25,1.5,2.64645,-.25,1.14645,4.9142,-.25,-.5858],
// 4 16 3.5 -0.25 1.5 4.9142 -0.25 -0.5858 5.5 -0.25 0 5.5 -0.25 1.5
  [4,16,3.5,-0.25,1.5,4.9142,-0.25,-0.5858,5.5,-0.25,0,5.5,-0.25,1.5],
// 3 16 0.5 -0.25 4.5 -0.5 -0.25 4.5 0.5 -0.25 2.5
  [3,16,0.5,-0.25,4.5,-0.5,-0.25,4.5,0.5,-0.25,2.5],
// 3 16 -0.5 -0.25 4.5 0.5 -0.25 1.5 0.5 -0.25 2.5
  [3,16,-0.5,-0.25,4.5,0.5,-0.25,1.5,0.5,-0.25,2.5],
// 4 16 0.5 -0.25 -0.5 0.5 -0.25 1.5 -0.5 -0.25 4.5 -0.5 -0.25 -3
  [4,16,0.5,-0.25,-0.5,0.5,-0.25,1.5,-0.5,-0.25,4.5,-0.5,-0.25,-3],
// 3 16 0.5 -0.25 -0.5 -0.5 -0.25 -3 0.5 -0.25 -1.5
  [3,16,0.5,-0.25,-0.5,-0.5,-0.25,-3,0.5,-0.25,-1.5],
// 3 16 0.5 -0.25 -1.5 -0.5 -0.25 -3 0.5 -0.25 -3
  [3,16,0.5,-0.25,-1.5,-0.5,-0.25,-3,0.5,-0.25,-3],
// 4 16 0.5 -0.25 -5 0.5 -0.25 -3 -0.5 -0.25 -3 -0.5 -0.25 -5
  [4,16,0.5,-0.25,-5,0.5,-0.25,-3,-0.5,-0.25,-3,-0.5,-0.25,-5],
// 3 16 6.5 -0.25 4.5 5.5 -0.25 4.5 5.5 -0.25 2.5
  [3,16,6.5,-0.25,4.5,5.5,-0.25,4.5,5.5,-0.25,2.5],
// 3 16 6.5 -0.25 4.5 5.5 -0.25 2.5 5.5 -0.25 1.5
  [3,16,6.5,-0.25,4.5,5.5,-0.25,2.5,5.5,-0.25,1.5],
// 4 16 6.5 -0.25 4.5 5.5 -0.25 1.5 5.5 -0.25 0 6.5 -0.25 -5
  [4,16,6.5,-0.25,4.5,5.5,-0.25,1.5,5.5,-0.25,0,6.5,-0.25,-5],
// 3 16 5.5 -0.25 0 5.5 -0.25 -2 6.5 -0.25 -5
  [3,16,5.5,-0.25,0,5.5,-0.25,-2,6.5,-0.25,-5],
// 3 16 5.5 -0.25 -2 5.5 -0.25 -3 6.5 -0.25 -5
  [3,16,5.5,-0.25,-2,5.5,-0.25,-3,6.5,-0.25,-5],
// 3 16 5.5 -0.25 -3 5.5 -0.25 -5 6.5 -0.25 -5
  [3,16,5.5,-0.25,-3,5.5,-0.25,-5,6.5,-0.25,-5],
// 4 16 -11.5 -0.25 -5 -11.5 -0.25 4.5 -14 -0.25 7 -14 -0.25 -7
  [4,16,-11.5,-0.25,-5,-11.5,-0.25,4.5,-14,-0.25,7,-14,-0.25,-7],
// 4 16 14 -0.25 7 11.5 -0.25 4.5 11.5 -0.25 -5 14 -0.25 -7
  [4,16,14,-0.25,7,11.5,-0.25,4.5,11.5,-0.25,-5,14,-0.25,-7],
// 4 16 -16 -0.25 -9 -16 -0.25 9 -17 -0.25 10 -17 -0.25 -10
  [4,16,-16,-0.25,-9,-16,-0.25,9,-17,-0.25,10,-17,-0.25,-10],
// 4 16 -16 -0.25 -9 -17 -0.25 -10 17 -0.25 -10 16 -0.25 -9
  [4,16,-16,-0.25,-9,-17,-0.25,-10,17,-0.25,-10,16,-0.25,-9],
// 4 16 16 -0.25 9 16 -0.25 -9 17 -0.25 -10 17 -0.25 10
  [4,16,16,-0.25,9,16,-0.25,-9,17,-0.25,-10,17,-0.25,10],
// 4 16 -16 -0.25 9 16 -0.25 9 17 -0.25 10 -17 -0.25 10
  [4,16,-16,-0.25,9,16,-0.25,9,17,-0.25,10,-17,-0.25,10],
// 4 16 14 -0.25 7 -14 -0.25 7 -0.5 -0.25 4.5 0.5 -0.25 4.5
  [4,16,14,-0.25,7,-14,-0.25,7,-0.5,-0.25,4.5,0.5,-0.25,4.5],
// 3 16 14 -0.25 7 0.5 -0.25 4.5 2.5 -0.25 4.5
  [3,16,14,-0.25,7,0.5,-0.25,4.5,2.5,-0.25,4.5],
// 3 16 14 -0.25 7 2.5 -0.25 4.5 3.5 -0.25 4.5
  [3,16,14,-0.25,7,2.5,-0.25,4.5,3.5,-0.25,4.5],
// 3 16 14 -0.25 7 3.5 -0.25 4.5 5.5 -0.25 4.5
  [3,16,14,-0.25,7,3.5,-0.25,4.5,5.5,-0.25,4.5],
// 3 16 14 -0.25 7 5.5 -0.25 4.5 6.5 -0.25 4.5
  [3,16,14,-0.25,7,5.5,-0.25,4.5,6.5,-0.25,4.5],
// 3 16 14 -0.25 7 6.5 -0.25 4.5 8.5 -0.25 4.5
  [3,16,14,-0.25,7,6.5,-0.25,4.5,8.5,-0.25,4.5],
// 3 16 14 -0.25 7 8.5 -0.25 4.5 9.5 -0.25 4.5
  [3,16,14,-0.25,7,8.5,-0.25,4.5,9.5,-0.25,4.5],
// 3 16 14 -0.25 7 9.5 -0.25 4.5 11.5 -0.25 4.5
  [3,16,14,-0.25,7,9.5,-0.25,4.5,11.5,-0.25,4.5],
// 3 16 -14 -0.25 7 -2.5 -0.25 4.5 -0.5 -0.25 4.5
  [3,16,-14,-0.25,7,-2.5,-0.25,4.5,-0.5,-0.25,4.5],
// 3 16 -14 -0.25 7 -3.5 -0.25 4.5 -2.5 -0.25 4.5
  [3,16,-14,-0.25,7,-3.5,-0.25,4.5,-2.5,-0.25,4.5],
// 3 16 -14 -0.25 7 -5.5 -0.25 4.5 -3.5 -0.25 4.5
  [3,16,-14,-0.25,7,-5.5,-0.25,4.5,-3.5,-0.25,4.5],
// 3 16 -14 -0.25 7 -6.5 -0.25 4.5 -5.5 -0.25 4.5
  [3,16,-14,-0.25,7,-6.5,-0.25,4.5,-5.5,-0.25,4.5],
// 3 16 -14 -0.25 7 -8 -0.25 4.5 -6.5 -0.25 4.5
  [3,16,-14,-0.25,7,-8,-0.25,4.5,-6.5,-0.25,4.5],
// 3 16 -14 -0.25 7 -11.5 -0.25 4.5 -8 -0.25 4.5
  [3,16,-14,-0.25,7,-11.5,-0.25,4.5,-8,-0.25,4.5],
// 4 16 -0.5 -0.25 -5 -14 -0.25 -7 14 -0.25 -7 0.5 -0.25 -5
  [4,16,-0.5,-0.25,-5,-14,-0.25,-7,14,-0.25,-7,0.5,-0.25,-5],
// 3 16 2.5 -0.25 -5 0.5 -0.25 -5 14 -0.25 -7
  [3,16,2.5,-0.25,-5,0.5,-0.25,-5,14,-0.25,-7],
// 3 16 3.5 -0.25 -5 2.5 -0.25 -5 14 -0.25 -7
  [3,16,3.5,-0.25,-5,2.5,-0.25,-5,14,-0.25,-7],
// 3 16 3.5 -0.25 -5 14 -0.25 -7 5.5 -0.25 -5
  [3,16,3.5,-0.25,-5,14,-0.25,-7,5.5,-0.25,-5],
// 3 16 6.5 -0.25 -5 5.5 -0.25 -5 14 -0.25 -7
  [3,16,6.5,-0.25,-5,5.5,-0.25,-5,14,-0.25,-7],
// 3 16 8.5 -0.25 -5 6.5 -0.25 -5 14 -0.25 -7
  [3,16,8.5,-0.25,-5,6.5,-0.25,-5,14,-0.25,-7],
// 3 16 9.5 -0.25 -5 8.5 -0.25 -5 14 -0.25 -7
  [3,16,9.5,-0.25,-5,8.5,-0.25,-5,14,-0.25,-7],
// 3 16 11.5 -0.25 -5 9.5 -0.25 -5 14 -0.25 -7
  [3,16,11.5,-0.25,-5,9.5,-0.25,-5,14,-0.25,-7],
// 3 16 -2.5 -0.25 -5 -14 -0.25 -7 -0.5 -0.25 -5
  [3,16,-2.5,-0.25,-5,-14,-0.25,-7,-0.5,-0.25,-5],
// 3 16 -2.5 -0.25 -5 -3.5 -0.25 -5 -14 -0.25 -7
  [3,16,-2.5,-0.25,-5,-3.5,-0.25,-5,-14,-0.25,-7],
// 3 16 -3.5 -0.25 -5 -5.5 -0.25 -5 -14 -0.25 -7
  [3,16,-3.5,-0.25,-5,-5.5,-0.25,-5,-14,-0.25,-7],
// 3 16 -5.5 -0.25 -5 -9.5 -0.25 -5 -14 -0.25 -7
  [3,16,-5.5,-0.25,-5,-9.5,-0.25,-5,-14,-0.25,-7],
// 3 16 -9.5 -0.25 -5 -11.5 -0.25 -5 -14 -0.25 -7
  [3,16,-9.5,-0.25,-5,-11.5,-0.25,-5,-14,-0.25,-7],
// 3 15 -3.5 -.25 -3 -5.5 -.25 -3 -3.5 -.25 -3.5
  [3,15,-3.5,-.25,-3,-5.5,-.25,-3,-3.5,-.25,-3.5],
// 3 15 -3.5 -.25 -3.5 -5.5 -.25 -3 -3.5 -.25 -5
  [3,15,-3.5,-.25,-3.5,-5.5,-.25,-3,-3.5,-.25,-5],
// 3 15 -.5 -.25 -3 -2.5 -.25 -3 -2.5 -.25 -3.5
  [3,15,-.5,-.25,-3,-2.5,-.25,-3,-2.5,-.25,-3.5],
// 3 15 -.5 -.25 -3 -2.5 -.25 -3.5 -2.5 -.25 -5
  [3,15,-.5,-.25,-3,-2.5,-.25,-3.5,-2.5,-.25,-5],
// 3 15 2.5 -.25 3 2.5 -.25 4.5 .5 -.25 2.5
  [3,15,2.5,-.25,3,2.5,-.25,4.5,.5,-.25,2.5],
// 3 15 5.5 -.25 2.5 3.5 -.25 4.5 3.5 -.25 3
  [3,15,5.5,-.25,2.5,3.5,-.25,4.5,3.5,-.25,3],
// 3 15 5.5 -.25 2.5 3.5 -.25 3 3.5 -.25 2.5
  [3,15,5.5,-.25,2.5,3.5,-.25,3,3.5,-.25,2.5],
// 3 15 3.5 -.25 -3.5 3.5 -.25 -5 5.5 -.25 -3
  [3,15,3.5,-.25,-3.5,3.5,-.25,-5,5.5,-.25,-3],
// 3 15 2.5 -.25 -3 .5 -.25 -3 2.5 -.25 -3.5
  [3,15,2.5,-.25,-3,.5,-.25,-3,2.5,-.25,-3.5],
// 3 15 2.5 -.25 -3.5 .5 -.25 -3 2.5 -.25 -5
  [3,15,2.5,-.25,-3.5,.5,-.25,-3,2.5,-.25,-5],
// 4 15 1.0858 -.25 .0858 2.5 -.25 1.5 2.5 -.25 2.5 .5 -.25 1.5
  [4,15,1.0858,-.25,.0858,2.5,-.25,1.5,2.5,-.25,2.5,.5,-.25,1.5],
// 4 15 3.5 -.25 -3 5.5 -.25 -2 4.9142 -.25 -.5858 3.5 -.25 -2
  [4,15,3.5,-.25,-3,5.5,-.25,-2,4.9142,-.25,-.5858,3.5,-.25,-2],
];
makepoly(ldraw_lib__4201018c(), line=0.2);
